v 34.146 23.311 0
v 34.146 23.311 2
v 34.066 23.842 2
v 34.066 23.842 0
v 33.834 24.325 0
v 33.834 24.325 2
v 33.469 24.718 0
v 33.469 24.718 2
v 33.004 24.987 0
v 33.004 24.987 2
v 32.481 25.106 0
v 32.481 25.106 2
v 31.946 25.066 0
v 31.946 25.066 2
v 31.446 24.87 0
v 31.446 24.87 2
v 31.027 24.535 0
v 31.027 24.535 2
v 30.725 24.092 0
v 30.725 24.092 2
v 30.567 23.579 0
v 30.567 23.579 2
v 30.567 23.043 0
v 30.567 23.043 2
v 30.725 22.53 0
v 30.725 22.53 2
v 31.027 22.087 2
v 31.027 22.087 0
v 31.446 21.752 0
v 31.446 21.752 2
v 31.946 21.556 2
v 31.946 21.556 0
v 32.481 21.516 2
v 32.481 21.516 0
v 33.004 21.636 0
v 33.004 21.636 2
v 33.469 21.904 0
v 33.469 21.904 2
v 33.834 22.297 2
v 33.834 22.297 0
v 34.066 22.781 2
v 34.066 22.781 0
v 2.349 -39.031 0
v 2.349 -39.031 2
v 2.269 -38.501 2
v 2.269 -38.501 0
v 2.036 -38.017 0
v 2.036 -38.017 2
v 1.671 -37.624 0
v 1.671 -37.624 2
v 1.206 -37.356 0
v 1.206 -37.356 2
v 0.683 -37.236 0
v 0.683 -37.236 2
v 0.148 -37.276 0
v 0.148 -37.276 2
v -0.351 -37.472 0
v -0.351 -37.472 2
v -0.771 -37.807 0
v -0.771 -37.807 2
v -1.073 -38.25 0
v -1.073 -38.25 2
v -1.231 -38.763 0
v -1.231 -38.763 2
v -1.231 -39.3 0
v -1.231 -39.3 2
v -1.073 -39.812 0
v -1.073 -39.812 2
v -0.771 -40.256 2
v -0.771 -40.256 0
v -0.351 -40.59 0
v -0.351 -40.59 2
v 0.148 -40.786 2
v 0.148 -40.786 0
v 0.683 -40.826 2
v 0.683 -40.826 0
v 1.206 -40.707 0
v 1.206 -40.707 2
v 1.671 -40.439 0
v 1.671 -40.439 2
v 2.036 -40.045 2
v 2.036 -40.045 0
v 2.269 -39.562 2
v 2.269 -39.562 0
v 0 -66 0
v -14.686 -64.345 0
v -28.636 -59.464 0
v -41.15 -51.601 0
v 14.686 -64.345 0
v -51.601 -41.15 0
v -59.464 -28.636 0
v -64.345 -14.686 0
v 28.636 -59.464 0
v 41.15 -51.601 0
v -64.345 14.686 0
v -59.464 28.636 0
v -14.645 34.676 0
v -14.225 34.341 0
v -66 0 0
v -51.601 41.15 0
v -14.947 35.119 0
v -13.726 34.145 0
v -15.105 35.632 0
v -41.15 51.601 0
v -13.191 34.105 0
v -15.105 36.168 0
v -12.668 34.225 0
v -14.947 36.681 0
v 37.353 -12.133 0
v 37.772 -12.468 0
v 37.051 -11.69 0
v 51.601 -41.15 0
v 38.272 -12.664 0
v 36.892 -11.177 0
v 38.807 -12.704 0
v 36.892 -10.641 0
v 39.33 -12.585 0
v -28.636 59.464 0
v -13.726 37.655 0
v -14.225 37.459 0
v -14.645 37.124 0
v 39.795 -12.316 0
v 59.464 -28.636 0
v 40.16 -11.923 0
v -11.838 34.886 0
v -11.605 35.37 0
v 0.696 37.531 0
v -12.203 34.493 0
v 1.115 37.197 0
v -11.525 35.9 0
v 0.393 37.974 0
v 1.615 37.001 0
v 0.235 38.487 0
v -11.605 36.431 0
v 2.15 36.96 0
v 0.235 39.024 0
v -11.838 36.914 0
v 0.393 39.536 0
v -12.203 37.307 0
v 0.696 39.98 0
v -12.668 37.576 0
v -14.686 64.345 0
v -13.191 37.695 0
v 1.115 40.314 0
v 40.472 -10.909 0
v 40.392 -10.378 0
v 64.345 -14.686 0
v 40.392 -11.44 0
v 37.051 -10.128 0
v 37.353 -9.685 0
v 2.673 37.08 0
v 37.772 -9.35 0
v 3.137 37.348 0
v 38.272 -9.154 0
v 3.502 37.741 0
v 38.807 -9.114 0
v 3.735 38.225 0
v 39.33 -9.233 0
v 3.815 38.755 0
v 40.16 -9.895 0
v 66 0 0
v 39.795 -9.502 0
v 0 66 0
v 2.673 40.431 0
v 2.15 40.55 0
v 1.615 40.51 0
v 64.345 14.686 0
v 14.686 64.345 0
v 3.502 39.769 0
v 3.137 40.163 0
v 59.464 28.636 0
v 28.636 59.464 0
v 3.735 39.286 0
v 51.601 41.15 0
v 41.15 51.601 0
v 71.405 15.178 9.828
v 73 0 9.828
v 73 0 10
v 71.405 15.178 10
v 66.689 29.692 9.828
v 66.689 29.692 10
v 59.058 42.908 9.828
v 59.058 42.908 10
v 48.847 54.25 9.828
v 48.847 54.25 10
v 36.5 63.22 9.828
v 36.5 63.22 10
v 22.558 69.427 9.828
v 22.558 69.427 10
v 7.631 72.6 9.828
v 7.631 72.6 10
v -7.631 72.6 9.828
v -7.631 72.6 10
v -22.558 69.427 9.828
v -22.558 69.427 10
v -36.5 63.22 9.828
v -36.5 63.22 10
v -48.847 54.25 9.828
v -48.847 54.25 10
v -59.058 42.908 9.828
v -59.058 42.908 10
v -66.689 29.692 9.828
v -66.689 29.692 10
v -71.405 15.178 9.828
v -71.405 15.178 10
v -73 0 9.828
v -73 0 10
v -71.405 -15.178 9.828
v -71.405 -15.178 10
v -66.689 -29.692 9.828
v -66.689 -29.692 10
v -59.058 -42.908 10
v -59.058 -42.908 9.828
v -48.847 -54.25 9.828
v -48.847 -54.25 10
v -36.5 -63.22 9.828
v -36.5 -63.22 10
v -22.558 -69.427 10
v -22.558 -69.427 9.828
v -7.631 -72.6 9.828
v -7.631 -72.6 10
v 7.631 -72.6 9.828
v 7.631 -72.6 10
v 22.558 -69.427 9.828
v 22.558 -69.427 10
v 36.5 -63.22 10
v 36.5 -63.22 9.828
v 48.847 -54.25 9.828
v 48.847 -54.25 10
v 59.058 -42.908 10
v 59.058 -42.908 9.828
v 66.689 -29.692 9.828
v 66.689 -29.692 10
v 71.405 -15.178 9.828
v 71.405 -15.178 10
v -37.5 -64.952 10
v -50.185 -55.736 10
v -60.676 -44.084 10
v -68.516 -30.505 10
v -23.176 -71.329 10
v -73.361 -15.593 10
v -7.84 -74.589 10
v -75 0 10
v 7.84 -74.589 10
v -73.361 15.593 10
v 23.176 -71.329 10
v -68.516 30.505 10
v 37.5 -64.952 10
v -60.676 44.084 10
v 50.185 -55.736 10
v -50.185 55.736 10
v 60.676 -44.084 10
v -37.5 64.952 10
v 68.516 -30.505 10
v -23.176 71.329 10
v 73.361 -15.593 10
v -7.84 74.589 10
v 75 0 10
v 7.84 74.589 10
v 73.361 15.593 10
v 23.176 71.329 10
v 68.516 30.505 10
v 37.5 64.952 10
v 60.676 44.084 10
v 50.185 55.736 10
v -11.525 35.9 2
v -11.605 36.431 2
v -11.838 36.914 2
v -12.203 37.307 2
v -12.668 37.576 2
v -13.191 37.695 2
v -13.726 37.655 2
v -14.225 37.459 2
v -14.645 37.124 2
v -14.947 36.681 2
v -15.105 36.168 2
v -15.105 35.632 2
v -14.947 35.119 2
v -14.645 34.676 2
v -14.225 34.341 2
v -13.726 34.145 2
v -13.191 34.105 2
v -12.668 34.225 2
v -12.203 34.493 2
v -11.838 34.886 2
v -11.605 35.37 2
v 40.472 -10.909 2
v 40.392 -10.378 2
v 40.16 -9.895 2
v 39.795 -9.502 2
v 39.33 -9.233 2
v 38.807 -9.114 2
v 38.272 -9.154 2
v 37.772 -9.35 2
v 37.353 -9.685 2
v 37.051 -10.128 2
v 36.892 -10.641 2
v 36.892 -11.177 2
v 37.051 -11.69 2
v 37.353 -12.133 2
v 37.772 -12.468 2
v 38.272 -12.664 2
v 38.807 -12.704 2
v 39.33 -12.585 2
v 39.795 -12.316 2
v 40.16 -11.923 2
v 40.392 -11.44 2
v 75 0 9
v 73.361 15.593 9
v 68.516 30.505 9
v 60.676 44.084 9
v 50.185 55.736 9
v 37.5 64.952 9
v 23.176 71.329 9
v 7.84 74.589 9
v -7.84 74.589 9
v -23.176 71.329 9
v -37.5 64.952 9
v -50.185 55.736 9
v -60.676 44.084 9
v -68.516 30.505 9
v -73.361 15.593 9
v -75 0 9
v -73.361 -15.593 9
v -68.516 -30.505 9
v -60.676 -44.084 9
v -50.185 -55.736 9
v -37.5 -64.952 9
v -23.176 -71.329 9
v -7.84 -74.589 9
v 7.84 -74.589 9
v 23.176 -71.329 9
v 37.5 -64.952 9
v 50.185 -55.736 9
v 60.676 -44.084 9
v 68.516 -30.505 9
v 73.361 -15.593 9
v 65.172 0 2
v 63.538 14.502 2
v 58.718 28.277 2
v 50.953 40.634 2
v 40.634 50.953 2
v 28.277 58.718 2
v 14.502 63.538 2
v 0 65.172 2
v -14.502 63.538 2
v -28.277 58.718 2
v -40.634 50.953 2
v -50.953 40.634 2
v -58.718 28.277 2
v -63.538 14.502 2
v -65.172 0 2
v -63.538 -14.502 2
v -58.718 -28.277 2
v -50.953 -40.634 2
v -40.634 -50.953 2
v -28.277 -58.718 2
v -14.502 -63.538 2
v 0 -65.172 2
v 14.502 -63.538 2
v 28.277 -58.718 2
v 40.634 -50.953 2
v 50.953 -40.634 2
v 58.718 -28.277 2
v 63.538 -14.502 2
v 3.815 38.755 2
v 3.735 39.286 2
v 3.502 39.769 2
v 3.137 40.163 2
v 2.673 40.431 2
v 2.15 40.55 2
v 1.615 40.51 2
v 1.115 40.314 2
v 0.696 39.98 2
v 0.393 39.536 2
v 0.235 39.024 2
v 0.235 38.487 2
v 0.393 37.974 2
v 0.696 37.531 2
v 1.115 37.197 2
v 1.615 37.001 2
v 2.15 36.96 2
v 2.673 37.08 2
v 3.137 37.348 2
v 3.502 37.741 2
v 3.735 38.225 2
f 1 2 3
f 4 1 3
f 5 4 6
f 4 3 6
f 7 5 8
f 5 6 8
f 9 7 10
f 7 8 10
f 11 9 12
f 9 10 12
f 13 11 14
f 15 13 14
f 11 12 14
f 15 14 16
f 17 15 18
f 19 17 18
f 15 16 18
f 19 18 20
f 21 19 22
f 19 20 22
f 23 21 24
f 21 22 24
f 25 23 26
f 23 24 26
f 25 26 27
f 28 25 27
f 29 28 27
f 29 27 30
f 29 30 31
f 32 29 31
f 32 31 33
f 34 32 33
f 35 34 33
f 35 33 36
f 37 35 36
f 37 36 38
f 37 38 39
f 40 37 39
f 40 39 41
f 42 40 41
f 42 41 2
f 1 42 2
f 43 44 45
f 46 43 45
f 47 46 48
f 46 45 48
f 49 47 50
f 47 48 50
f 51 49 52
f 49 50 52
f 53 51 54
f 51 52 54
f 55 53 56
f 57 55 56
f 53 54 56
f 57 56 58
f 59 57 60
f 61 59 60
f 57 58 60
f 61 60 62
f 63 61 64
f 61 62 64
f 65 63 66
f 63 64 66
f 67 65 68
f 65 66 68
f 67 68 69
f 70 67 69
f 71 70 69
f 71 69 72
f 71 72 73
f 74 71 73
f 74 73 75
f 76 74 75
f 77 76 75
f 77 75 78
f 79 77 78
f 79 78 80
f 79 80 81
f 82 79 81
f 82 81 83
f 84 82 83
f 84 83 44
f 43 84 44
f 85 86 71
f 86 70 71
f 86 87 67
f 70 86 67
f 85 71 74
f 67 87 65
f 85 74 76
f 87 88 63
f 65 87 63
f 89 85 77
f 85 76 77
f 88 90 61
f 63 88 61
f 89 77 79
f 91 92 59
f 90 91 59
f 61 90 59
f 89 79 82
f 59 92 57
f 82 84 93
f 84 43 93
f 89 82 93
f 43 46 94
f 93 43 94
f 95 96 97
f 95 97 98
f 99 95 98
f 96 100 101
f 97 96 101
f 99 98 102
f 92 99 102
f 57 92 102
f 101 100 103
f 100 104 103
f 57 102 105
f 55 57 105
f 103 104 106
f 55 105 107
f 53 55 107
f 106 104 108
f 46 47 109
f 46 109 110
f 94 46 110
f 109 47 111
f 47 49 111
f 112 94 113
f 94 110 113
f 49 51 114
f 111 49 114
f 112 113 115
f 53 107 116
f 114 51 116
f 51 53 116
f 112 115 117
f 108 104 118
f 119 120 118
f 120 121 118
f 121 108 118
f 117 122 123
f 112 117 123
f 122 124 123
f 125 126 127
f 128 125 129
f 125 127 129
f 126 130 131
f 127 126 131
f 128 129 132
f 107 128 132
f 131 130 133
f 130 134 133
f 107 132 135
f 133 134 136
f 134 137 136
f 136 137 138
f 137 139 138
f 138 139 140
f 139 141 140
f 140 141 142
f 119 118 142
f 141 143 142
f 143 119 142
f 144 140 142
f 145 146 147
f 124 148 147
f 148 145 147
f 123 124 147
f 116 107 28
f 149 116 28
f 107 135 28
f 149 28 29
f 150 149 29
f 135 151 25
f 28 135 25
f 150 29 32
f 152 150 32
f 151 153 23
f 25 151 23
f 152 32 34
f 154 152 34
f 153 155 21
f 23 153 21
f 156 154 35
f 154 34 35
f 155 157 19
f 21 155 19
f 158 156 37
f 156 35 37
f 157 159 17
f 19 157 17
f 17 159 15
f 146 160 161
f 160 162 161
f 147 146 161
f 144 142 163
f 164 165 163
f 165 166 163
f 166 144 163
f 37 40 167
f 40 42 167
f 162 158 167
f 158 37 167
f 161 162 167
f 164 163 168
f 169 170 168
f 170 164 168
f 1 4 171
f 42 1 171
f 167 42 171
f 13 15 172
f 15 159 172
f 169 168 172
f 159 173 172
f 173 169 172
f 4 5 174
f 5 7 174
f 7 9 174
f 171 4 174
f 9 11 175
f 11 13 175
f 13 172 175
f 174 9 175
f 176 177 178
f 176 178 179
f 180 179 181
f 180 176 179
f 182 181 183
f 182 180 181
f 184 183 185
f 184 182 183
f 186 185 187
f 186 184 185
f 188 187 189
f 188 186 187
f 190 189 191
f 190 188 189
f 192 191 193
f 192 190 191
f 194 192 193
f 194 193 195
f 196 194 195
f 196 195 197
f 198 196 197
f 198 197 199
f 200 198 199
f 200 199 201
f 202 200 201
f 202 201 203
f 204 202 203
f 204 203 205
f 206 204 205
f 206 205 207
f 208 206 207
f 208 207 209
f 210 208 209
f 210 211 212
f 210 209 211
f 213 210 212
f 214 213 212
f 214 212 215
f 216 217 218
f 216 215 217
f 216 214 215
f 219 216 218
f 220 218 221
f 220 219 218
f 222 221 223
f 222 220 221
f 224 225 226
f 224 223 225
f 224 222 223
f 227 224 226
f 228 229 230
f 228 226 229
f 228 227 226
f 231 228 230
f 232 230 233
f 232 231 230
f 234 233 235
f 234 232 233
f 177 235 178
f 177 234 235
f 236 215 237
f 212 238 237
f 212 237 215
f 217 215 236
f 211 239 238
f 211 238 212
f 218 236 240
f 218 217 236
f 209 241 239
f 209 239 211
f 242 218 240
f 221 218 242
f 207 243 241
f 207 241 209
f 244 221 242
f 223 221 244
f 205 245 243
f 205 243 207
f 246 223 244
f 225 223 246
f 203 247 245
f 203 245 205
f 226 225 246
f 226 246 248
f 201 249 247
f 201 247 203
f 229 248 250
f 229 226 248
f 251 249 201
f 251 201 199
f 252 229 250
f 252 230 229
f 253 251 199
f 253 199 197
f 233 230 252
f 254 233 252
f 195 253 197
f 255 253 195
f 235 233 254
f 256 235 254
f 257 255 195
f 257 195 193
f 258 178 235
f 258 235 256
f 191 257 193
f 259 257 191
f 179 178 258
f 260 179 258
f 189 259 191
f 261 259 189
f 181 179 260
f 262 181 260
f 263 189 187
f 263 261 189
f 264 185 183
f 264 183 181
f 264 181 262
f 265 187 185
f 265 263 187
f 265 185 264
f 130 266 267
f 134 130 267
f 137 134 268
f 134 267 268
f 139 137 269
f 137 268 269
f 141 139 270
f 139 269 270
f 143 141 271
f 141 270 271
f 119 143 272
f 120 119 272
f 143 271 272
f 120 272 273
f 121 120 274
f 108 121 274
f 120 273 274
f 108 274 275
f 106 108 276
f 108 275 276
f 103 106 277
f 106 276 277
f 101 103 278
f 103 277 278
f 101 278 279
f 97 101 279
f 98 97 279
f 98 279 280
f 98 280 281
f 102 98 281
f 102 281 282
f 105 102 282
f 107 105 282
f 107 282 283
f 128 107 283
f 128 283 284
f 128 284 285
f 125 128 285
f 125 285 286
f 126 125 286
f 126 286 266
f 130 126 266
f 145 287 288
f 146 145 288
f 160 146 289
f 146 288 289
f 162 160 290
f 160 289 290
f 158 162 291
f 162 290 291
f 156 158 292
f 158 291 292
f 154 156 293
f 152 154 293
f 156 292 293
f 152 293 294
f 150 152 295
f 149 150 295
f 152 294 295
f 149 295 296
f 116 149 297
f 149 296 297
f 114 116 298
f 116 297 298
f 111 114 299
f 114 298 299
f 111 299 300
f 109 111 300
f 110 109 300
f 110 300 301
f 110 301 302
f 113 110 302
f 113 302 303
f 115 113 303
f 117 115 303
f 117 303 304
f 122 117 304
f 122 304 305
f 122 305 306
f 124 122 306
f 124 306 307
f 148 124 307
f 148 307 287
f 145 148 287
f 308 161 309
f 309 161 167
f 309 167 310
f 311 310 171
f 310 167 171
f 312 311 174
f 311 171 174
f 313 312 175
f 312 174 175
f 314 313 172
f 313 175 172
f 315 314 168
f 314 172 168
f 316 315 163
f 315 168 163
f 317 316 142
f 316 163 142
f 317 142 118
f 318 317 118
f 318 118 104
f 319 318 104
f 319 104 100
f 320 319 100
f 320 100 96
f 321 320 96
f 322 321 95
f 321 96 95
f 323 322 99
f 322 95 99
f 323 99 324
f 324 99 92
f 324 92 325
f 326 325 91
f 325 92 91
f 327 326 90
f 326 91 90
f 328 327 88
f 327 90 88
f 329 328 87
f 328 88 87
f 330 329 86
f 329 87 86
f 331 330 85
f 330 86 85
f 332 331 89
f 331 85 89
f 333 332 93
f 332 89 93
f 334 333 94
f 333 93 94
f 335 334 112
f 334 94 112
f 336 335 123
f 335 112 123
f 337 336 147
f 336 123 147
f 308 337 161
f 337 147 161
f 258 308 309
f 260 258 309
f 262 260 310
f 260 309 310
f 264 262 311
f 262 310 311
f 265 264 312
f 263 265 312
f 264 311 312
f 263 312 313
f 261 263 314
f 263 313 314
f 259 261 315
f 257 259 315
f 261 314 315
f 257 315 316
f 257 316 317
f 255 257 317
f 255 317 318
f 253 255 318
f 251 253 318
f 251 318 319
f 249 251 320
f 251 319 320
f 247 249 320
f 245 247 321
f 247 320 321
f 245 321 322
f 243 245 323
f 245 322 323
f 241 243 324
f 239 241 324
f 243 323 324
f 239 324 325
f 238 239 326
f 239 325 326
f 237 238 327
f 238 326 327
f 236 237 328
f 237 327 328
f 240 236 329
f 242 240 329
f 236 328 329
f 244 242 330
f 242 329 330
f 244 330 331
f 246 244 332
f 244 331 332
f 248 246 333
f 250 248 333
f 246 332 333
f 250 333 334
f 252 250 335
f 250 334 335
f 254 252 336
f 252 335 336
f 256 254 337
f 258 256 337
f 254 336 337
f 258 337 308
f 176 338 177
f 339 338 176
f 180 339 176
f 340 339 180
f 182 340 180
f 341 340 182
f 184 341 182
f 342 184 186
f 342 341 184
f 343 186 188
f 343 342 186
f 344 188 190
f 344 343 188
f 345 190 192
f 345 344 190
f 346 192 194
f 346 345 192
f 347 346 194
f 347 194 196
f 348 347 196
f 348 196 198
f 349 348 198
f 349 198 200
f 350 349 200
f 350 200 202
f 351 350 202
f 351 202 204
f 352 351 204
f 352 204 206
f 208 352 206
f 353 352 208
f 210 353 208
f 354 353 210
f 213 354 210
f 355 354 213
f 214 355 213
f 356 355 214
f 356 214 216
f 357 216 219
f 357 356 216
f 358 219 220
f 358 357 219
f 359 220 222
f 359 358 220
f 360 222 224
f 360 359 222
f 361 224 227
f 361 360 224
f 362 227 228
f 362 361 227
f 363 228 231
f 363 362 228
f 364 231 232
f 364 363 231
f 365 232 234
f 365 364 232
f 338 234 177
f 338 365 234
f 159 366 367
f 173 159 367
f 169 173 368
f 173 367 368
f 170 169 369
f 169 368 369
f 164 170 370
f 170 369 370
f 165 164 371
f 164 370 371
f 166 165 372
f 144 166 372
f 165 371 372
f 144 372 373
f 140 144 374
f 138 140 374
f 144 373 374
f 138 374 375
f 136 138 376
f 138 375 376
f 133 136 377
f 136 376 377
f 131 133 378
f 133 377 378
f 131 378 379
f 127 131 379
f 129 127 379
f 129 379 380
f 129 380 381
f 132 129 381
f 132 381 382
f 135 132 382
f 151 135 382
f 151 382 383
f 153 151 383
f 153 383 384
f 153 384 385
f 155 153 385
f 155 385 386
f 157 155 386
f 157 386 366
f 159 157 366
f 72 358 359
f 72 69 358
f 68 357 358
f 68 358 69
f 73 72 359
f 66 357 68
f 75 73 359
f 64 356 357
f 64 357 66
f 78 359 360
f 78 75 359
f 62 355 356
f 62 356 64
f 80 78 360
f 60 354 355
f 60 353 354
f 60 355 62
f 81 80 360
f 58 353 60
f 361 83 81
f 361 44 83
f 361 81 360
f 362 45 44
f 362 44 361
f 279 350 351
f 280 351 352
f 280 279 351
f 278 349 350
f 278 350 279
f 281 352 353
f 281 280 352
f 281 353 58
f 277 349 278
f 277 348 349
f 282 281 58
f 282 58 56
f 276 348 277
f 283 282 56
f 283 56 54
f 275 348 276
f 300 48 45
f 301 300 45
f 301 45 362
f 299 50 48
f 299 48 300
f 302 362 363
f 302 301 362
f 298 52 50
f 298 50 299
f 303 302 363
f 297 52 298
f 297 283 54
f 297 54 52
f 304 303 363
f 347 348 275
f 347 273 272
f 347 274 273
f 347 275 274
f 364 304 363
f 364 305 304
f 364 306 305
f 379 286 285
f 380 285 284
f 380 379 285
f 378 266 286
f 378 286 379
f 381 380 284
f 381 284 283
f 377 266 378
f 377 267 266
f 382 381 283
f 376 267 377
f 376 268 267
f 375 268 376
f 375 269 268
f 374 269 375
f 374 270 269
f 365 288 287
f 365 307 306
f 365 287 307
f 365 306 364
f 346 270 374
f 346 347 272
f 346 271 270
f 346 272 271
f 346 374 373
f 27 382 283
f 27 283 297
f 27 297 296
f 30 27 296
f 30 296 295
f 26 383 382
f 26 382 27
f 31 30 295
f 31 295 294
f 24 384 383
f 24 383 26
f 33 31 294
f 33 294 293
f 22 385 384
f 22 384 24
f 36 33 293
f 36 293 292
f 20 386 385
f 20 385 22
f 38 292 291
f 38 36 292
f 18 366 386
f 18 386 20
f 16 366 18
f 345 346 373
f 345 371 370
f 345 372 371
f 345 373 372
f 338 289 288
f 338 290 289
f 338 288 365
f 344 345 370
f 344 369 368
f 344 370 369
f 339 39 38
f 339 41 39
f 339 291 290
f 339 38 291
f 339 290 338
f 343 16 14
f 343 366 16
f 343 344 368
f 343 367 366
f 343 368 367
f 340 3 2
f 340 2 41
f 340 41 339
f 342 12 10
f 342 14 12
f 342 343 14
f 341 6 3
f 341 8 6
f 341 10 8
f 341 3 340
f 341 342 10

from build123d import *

# Parameters (mm, degrees)
SKETCH1_R           = 75
BOSS_EXTRUDE1_DEPTH = 10
CHAMFER1_SIZE       = 9
SHELL1_T            = -2
SKETCH2_R           = 1.8
CUT_EXTRUDE1_DEPTH  = 107.367288205


with BuildPart() as part:
    # Sketch1 → Boss-Extrude1 (new body)
    with BuildSketch(Plane.XY):
        Circle(SKETCH1_R)
    extrude(amount=BOSS_EXTRUDE1_DEPTH)

    # Chamfer1
    chamfer1_edges = [part.edges().sort_by_distance(p)[0] for p in [
        (-75, 0, 0),
    ]]
    chamfer(chamfer1_edges, length=CHAMFER1_SIZE)

    # Shell1
    shell1_openings = [part.faces().sort_by_distance(p)[0] for p in [
        (0, 0, 10),
    ]]
    offset(amount=SHELL1_T, openings=shell1_openings, kind=Kind.INTERSECTION)

    # Sketch2 → Cut-Extrude1 (cut, through all)
    with BuildSketch(Plane.XY.offset(2)):
        with Locations((2.015078633, 38.755426444)):
            Circle(SKETCH2_R)
        with Locations((-13.325453752, 35.900076006)):
            Circle(SKETCH2_R)
        with Locations((0.548769327, -39.031280101)):
            Circle(SKETCH2_R)
        with Locations((38.672351506, -10.909043386)):
            Circle(SKETCH2_R)
        with Locations((32.346402761, 23.31116451)):
            Circle(SKETCH2_R)
    extrude(amount=-CUT_EXTRUDE1_DEPTH, mode=Mode.SUBTRACT)


solid = part.part
